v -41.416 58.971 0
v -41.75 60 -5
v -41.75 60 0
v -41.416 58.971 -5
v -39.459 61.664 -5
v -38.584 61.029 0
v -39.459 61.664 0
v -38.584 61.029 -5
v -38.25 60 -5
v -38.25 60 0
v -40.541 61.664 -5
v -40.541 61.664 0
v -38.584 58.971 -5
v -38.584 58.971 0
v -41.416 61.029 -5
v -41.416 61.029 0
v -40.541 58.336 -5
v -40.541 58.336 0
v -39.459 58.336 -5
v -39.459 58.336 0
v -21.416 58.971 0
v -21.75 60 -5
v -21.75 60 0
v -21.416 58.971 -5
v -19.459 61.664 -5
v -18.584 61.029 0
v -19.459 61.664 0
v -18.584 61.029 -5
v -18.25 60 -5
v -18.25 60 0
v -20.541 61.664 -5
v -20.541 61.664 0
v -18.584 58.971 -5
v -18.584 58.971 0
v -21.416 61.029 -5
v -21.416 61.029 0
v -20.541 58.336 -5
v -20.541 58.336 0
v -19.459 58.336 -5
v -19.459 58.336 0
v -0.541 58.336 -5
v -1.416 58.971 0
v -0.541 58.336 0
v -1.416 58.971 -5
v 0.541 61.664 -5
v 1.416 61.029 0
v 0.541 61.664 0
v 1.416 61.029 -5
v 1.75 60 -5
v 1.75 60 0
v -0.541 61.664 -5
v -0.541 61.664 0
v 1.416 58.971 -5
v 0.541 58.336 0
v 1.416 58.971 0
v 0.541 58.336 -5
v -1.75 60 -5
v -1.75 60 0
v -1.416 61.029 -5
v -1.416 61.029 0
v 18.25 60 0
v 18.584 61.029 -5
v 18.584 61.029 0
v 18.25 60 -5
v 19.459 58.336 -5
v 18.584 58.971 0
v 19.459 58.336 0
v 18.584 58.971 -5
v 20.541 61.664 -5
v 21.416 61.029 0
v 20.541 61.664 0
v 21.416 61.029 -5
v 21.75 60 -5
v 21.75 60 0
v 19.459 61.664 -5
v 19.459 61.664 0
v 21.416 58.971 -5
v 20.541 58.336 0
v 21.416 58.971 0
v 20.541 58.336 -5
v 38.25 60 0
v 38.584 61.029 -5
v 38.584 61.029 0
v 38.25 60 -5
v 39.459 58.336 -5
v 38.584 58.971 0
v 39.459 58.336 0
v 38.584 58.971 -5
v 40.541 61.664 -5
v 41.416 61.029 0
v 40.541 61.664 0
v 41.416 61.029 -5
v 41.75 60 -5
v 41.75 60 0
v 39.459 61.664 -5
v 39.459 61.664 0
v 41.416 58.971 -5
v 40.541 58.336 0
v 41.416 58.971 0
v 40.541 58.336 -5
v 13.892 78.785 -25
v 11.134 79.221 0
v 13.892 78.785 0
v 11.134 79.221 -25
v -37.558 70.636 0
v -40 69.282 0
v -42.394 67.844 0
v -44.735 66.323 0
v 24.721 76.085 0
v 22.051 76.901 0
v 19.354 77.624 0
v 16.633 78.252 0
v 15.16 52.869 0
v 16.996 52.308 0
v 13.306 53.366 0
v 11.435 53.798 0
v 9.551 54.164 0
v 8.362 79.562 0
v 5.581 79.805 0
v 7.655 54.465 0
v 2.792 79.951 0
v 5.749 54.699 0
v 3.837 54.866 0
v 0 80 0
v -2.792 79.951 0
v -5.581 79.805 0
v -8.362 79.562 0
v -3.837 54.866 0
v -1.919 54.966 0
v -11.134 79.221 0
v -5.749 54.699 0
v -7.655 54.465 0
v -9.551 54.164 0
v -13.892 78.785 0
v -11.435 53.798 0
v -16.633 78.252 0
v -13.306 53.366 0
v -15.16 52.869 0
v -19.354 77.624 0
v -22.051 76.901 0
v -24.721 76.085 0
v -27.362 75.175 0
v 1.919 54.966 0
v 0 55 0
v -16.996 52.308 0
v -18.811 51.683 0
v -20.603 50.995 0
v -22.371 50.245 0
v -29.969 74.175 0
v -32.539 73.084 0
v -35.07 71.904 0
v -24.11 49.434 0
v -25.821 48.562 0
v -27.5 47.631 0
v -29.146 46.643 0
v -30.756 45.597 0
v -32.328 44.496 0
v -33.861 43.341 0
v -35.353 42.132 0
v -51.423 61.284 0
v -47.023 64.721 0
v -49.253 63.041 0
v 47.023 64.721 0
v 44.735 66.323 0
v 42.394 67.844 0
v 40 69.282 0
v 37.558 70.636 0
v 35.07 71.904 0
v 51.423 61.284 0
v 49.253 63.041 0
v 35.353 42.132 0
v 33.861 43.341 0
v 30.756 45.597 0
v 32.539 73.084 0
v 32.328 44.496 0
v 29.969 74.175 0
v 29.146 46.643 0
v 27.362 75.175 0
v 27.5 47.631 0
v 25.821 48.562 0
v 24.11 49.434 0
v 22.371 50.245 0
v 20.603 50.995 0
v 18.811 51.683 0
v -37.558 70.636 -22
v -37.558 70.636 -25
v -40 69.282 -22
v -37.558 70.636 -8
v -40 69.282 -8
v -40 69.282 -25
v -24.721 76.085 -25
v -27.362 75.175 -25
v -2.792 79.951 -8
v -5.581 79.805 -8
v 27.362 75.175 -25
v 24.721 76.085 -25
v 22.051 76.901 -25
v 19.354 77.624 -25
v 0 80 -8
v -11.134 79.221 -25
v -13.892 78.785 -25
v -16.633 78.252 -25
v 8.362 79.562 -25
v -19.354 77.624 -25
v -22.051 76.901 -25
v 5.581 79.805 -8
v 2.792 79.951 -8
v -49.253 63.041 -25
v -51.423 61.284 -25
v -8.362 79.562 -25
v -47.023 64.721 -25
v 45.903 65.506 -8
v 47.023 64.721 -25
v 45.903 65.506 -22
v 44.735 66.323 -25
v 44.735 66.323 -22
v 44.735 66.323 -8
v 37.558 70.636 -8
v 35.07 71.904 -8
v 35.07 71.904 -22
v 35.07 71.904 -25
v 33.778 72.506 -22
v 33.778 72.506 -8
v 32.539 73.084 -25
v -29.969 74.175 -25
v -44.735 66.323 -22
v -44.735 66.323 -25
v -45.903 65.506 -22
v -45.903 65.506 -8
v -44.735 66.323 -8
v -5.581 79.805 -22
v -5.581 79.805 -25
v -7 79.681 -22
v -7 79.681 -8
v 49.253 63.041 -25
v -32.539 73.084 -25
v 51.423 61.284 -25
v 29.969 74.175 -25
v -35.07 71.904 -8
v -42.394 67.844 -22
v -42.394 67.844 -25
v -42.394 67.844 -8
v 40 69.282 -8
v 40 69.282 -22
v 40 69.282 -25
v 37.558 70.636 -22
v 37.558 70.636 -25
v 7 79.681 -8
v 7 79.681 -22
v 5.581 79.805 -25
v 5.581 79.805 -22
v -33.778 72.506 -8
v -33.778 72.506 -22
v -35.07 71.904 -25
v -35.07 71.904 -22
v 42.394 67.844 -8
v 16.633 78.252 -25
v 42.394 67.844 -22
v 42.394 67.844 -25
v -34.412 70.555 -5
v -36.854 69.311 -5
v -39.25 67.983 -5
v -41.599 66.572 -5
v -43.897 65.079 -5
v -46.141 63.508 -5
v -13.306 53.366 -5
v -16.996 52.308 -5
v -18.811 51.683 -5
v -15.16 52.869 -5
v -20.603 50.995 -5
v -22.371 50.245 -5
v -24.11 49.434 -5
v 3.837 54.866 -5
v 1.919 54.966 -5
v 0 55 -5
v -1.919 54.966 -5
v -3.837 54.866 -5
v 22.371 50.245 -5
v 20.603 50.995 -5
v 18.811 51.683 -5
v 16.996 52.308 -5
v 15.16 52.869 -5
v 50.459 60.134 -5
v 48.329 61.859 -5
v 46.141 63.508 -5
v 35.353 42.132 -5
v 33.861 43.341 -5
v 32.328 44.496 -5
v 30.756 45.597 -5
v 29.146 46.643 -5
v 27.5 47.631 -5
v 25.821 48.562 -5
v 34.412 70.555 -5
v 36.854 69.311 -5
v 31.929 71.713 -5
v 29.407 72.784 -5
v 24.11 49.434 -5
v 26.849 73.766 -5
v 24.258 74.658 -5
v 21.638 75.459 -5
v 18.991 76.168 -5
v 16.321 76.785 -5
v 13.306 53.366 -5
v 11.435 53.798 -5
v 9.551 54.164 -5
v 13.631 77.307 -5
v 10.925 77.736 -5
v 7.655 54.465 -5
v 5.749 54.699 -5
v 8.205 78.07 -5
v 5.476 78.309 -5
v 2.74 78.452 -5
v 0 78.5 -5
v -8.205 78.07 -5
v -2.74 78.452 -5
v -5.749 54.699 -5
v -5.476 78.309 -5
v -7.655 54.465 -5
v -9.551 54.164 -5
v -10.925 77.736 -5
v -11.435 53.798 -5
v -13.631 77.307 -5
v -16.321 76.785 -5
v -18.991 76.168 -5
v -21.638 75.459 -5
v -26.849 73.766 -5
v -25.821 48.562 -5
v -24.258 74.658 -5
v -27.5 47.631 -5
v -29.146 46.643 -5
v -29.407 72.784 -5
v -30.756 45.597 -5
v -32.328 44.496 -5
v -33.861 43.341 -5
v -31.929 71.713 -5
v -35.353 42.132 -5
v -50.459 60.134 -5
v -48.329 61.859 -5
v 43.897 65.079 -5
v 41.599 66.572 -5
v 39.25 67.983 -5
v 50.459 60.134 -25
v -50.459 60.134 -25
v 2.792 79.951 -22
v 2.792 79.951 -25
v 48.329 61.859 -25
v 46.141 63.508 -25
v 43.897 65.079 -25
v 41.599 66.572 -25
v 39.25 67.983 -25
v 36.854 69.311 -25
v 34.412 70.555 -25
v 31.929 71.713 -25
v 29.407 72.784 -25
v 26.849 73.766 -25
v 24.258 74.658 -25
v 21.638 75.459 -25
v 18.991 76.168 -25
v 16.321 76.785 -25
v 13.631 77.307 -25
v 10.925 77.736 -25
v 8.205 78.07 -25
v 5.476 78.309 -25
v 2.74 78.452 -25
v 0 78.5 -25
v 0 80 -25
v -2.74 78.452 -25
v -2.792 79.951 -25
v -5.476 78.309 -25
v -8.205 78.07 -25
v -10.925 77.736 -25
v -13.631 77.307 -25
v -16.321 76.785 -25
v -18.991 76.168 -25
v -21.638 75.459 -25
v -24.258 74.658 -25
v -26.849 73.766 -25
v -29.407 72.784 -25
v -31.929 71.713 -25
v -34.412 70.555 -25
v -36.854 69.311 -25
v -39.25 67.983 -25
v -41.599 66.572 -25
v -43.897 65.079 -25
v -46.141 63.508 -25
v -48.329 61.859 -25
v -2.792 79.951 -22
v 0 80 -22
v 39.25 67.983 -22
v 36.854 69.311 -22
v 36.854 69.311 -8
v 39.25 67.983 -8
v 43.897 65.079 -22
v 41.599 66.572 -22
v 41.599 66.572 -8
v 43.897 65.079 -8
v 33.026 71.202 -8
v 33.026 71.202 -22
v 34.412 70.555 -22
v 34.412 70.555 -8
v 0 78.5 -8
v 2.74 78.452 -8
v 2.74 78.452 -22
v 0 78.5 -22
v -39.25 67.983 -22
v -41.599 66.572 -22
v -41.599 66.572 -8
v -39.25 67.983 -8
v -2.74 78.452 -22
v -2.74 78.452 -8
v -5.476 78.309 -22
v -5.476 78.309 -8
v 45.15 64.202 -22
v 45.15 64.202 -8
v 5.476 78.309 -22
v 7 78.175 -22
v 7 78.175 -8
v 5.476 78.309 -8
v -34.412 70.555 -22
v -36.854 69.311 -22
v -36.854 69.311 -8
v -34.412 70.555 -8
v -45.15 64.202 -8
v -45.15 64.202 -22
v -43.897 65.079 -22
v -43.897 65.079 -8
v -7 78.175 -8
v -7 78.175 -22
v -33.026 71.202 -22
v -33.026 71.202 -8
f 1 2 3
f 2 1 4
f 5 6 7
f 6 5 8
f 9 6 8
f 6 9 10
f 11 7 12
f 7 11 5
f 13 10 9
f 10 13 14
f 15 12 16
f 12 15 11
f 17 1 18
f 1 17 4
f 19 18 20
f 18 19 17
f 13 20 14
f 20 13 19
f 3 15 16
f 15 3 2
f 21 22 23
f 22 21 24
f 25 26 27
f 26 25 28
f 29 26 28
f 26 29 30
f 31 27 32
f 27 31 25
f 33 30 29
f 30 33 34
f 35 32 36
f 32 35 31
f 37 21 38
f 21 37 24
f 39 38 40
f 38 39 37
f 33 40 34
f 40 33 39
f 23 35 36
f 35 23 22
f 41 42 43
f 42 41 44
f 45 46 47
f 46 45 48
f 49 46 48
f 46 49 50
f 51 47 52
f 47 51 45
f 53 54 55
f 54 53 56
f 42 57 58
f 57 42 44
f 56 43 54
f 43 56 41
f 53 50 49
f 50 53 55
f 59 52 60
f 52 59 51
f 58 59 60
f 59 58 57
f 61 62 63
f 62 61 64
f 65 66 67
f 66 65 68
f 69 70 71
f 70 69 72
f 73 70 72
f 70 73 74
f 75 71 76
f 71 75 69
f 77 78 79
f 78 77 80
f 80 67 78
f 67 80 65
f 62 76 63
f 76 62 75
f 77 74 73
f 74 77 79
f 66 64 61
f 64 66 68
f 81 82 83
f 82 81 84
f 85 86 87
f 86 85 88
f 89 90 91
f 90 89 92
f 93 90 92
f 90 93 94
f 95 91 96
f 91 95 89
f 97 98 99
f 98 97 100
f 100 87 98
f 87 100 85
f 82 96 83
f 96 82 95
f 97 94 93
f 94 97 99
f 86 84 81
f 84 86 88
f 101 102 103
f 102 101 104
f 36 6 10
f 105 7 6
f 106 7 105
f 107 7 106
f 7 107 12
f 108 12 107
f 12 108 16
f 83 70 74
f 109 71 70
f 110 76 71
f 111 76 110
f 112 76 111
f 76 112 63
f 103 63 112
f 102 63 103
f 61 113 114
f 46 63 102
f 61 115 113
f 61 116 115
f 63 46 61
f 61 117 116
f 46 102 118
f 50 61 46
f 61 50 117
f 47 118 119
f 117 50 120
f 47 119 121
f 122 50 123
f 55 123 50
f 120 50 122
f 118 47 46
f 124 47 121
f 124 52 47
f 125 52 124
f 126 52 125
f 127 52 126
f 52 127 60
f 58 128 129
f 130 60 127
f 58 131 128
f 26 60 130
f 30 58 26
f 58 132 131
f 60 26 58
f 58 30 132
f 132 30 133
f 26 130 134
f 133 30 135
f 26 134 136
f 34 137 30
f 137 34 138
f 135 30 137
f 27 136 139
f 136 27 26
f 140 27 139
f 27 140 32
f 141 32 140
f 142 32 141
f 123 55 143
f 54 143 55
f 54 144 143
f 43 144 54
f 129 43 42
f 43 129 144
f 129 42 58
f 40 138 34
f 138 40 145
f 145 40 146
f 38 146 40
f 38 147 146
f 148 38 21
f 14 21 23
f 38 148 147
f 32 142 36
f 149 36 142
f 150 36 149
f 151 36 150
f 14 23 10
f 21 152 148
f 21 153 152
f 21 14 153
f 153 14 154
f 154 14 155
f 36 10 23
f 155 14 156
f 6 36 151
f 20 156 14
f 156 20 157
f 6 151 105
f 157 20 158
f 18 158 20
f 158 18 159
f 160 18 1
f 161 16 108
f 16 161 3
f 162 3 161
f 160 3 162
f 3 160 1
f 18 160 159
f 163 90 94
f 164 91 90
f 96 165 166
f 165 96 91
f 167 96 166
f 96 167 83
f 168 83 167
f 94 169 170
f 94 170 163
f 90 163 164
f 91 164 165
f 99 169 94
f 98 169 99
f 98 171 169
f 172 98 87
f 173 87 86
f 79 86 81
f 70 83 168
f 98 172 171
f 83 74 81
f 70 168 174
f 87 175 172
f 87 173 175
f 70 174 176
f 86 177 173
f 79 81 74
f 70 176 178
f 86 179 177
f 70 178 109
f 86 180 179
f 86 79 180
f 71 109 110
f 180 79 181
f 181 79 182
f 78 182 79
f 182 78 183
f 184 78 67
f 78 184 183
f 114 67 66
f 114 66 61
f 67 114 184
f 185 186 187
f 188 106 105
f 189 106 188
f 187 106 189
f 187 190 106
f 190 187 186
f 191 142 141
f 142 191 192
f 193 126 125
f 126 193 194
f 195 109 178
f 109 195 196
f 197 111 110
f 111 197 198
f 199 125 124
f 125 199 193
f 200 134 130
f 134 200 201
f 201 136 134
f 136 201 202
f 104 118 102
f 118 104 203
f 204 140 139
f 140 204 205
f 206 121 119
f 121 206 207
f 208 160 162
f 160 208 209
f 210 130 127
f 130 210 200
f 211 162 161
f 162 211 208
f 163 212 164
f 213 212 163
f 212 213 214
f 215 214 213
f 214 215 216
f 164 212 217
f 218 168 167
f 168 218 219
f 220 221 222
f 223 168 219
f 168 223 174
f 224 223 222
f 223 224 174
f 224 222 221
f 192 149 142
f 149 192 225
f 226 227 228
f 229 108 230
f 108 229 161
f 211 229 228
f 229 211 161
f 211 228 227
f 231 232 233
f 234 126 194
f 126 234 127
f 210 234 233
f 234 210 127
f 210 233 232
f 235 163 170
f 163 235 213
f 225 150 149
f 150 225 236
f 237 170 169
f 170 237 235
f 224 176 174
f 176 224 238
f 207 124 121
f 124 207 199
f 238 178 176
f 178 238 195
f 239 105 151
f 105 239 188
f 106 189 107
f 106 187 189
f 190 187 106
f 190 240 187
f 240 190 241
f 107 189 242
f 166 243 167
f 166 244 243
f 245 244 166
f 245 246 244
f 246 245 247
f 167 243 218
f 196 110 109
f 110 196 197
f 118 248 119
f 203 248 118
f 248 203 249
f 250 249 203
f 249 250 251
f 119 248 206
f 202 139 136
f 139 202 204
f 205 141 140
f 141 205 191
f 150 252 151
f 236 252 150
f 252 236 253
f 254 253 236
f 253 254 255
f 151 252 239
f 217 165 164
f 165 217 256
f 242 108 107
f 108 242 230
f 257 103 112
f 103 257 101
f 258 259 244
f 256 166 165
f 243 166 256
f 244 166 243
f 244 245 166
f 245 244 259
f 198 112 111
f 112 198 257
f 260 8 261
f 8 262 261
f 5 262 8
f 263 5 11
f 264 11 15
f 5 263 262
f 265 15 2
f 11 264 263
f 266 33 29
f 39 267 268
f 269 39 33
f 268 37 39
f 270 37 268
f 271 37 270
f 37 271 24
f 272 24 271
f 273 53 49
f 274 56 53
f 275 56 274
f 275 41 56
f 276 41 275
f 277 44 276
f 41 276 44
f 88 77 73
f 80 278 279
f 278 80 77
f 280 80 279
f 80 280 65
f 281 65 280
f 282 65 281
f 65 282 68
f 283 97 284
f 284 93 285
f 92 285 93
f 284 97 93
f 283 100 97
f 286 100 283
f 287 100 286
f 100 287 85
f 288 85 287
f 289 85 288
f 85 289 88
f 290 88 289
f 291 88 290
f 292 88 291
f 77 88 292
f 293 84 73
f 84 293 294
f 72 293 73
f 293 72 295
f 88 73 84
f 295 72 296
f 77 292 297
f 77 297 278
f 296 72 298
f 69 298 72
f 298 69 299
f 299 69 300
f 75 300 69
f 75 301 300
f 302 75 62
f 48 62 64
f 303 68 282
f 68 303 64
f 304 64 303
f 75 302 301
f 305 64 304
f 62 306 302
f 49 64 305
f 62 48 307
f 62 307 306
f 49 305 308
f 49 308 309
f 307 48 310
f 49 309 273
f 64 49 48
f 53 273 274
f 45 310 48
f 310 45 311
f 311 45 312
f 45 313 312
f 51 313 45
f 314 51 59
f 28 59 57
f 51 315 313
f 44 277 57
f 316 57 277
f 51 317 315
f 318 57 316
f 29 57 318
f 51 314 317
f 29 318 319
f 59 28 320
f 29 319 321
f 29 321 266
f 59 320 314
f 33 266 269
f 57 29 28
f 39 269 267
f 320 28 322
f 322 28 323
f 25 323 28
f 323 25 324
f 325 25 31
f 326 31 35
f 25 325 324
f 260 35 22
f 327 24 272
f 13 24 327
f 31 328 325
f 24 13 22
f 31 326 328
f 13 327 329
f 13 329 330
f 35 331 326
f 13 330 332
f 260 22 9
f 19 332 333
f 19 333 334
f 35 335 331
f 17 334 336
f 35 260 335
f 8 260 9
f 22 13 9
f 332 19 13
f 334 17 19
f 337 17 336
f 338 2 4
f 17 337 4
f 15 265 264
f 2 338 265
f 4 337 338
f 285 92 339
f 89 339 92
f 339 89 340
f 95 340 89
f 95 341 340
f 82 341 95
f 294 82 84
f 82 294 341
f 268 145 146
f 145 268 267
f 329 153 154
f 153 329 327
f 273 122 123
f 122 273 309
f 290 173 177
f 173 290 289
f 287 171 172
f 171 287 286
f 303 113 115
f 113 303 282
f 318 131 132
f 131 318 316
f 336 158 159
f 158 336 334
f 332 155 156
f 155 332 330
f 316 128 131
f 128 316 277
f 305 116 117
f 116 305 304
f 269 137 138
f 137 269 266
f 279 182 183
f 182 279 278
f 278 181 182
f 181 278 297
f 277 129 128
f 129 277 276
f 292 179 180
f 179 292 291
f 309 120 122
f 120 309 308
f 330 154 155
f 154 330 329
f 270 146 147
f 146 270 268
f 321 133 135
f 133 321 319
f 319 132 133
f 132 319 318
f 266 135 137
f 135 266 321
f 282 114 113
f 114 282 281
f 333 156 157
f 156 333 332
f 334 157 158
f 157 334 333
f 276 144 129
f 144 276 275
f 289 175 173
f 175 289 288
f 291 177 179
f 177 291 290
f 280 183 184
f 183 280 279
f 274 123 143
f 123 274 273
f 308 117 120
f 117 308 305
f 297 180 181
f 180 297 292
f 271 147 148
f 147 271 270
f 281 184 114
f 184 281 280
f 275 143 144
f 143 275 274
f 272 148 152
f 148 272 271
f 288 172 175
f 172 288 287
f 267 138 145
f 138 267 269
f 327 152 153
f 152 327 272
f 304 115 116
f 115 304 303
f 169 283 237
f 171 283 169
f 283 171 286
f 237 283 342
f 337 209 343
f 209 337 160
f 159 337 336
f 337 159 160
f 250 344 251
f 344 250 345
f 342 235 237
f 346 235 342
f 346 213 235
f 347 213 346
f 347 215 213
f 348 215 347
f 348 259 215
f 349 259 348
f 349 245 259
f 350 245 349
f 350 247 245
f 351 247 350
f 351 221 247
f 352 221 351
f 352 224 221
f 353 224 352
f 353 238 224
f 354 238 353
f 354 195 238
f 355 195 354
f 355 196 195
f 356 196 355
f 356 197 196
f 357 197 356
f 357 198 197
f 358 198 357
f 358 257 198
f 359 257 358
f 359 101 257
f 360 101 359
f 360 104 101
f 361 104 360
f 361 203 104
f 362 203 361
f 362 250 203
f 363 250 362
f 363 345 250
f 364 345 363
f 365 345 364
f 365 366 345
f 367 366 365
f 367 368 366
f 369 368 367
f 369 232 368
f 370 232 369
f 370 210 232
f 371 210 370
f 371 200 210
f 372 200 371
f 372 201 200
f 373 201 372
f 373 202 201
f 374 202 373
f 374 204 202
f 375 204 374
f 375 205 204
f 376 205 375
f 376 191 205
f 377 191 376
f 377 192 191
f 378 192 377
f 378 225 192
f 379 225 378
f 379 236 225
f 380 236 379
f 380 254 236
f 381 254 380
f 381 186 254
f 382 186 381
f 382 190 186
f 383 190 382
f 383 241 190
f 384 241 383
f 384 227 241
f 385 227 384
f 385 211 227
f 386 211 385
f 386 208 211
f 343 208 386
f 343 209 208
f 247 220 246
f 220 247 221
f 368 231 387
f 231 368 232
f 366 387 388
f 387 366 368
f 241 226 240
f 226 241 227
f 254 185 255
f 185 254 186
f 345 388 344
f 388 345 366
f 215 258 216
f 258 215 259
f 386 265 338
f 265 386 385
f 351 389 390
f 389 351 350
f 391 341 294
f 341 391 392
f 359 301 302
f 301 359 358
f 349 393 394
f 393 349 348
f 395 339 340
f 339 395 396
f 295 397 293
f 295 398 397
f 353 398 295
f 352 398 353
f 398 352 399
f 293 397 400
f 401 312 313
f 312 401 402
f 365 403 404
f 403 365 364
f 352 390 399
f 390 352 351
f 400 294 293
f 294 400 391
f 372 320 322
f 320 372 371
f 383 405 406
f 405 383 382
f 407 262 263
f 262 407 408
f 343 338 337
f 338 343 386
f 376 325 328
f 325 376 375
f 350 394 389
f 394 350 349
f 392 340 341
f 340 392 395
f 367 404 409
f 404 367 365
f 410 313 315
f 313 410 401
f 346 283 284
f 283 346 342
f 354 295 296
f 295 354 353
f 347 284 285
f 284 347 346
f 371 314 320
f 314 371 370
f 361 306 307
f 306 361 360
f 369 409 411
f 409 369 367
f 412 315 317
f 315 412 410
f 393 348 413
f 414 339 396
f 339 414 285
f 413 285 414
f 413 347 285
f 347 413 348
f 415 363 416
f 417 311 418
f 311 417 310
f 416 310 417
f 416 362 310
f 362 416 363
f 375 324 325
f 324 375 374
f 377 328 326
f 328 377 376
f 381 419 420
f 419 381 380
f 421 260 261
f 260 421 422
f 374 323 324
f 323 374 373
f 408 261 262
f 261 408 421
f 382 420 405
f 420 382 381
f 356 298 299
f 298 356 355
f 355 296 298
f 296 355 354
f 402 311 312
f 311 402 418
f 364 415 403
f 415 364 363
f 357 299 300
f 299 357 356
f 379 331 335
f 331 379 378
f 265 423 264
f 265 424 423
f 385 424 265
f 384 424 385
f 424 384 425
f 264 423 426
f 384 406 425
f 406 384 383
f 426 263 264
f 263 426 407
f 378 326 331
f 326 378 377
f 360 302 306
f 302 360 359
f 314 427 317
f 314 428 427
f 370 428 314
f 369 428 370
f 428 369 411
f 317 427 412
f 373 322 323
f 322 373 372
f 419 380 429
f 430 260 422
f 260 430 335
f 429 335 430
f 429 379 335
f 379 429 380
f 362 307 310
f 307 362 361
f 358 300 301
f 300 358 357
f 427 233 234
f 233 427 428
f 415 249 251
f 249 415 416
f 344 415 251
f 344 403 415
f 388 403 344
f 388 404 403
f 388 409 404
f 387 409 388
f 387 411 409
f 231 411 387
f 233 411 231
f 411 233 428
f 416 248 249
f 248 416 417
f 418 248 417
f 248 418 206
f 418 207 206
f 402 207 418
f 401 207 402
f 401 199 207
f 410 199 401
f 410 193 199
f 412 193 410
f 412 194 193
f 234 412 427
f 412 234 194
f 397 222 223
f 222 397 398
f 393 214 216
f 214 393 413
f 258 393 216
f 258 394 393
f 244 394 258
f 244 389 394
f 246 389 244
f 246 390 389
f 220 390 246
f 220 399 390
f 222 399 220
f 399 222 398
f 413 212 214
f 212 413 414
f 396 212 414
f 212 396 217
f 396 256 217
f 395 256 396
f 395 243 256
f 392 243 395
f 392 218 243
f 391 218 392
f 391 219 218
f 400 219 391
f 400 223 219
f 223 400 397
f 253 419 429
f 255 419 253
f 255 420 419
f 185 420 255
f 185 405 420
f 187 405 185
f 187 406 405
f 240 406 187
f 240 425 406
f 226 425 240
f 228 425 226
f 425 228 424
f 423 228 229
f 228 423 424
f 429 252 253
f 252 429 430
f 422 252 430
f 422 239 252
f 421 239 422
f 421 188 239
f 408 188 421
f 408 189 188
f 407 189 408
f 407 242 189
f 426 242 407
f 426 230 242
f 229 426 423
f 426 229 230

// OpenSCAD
// file: orp_circular_plate_3d.scad
// Parameters
//plate_diameter = 160;
//plate_thickness = 3;


module orp_plate(plate_diameter, plate_thickness = 3, plate_resolution = 50, hole_resolution = 10){
    hole_diameter = 3.5; // ORP rules
    hole_spacing = 20; // ORP rules
    num_holes_x = floor(plate_diameter / hole_spacing);
    num_holes_y = floor(plate_diameter / hole_spacing);
    
    difference() {
        cylinder(h = plate_thickness, d = plate_diameter, $fn=plate_resolution);
    
        for (i = [-floor(plate_diameter / hole_spacing / 2):floor(plate_diameter / hole_spacing / 2)]) {
            for (j = [-floor(plate_diameter / hole_spacing / 2):floor(plate_diameter / hole_spacing / 2)]) {
                x = i * hole_spacing;
                y = j * hole_spacing;
                if (sqrt(x*x + y*y) + hole_diameter/2 <= plate_diameter/2) {
                    translate([x, y, -1])
                        cylinder(h = plate_thickness + 2, d = hole_diameter, $fn=hole_resolution);
                }
            }
        }
    }
}
// main file
$fn = 180;
mount_outer_radius = 80;
mount_inner_radius = mount_outer_radius -25;
mount_thickness = 5;
lip_depth = 20;
lip_thickness = 1.5;

include <orp_circular_plate_3d.scad>;

module cut_wedge(h, start_angle = 40, end_angle = 320){
        linear_extrude(h+1){
        points = [
            [0, 0], // Center of the cylinder
    
            // Points along the arc for the 90-degree segment
            for (angle = start_angle; angle <= end_angle; angle = angle + 1) // Increment by 1 degree for smoothness
                [(mount_outer_radius+1) * sin(angle), (mount_outer_radius+1) * cos(angle)]
        ];
        //echo(points);
        polygon(points = points);
        
    }}
 
    
module cut_switch_hole(radius, angle, switch_hole_size = 14, cut_depth = 1.5){
    //radius is the distance from the orgin for the cut to start
    //angle is the angle relative to the y axis
    rotate([-90, 0, angle])
    translate([0, -(lip_depth/2), radius-cut_depth]){
        linear_extrude(height = cut_depth*2, center = true) { 
            square(size = switch_hole_size, center = true);
        }
    }
}

//orp_plate(mount_outer_radius*2);
translate([0, 0, -mount_thickness])
difference(){
    orp_plate(mount_outer_radius*2, plate_thickness = mount_thickness, plate_resolution = 180);
    cylinder(h = mount_thickness, r = mount_inner_radius);
    cut_wedge(h = mount_thickness);
}
// add the outer lip
translate([0, 0, -(mount_thickness+lip_depth)])
difference(){
    cylinder(h = lip_depth, r = mount_outer_radius);
    cylinder(h = lip_depth, r = (mount_outer_radius - lip_thickness));
    cut_wedge(h = lip_depth);
    #cut_switch_hole(radius = mount_outer_radius, angle = 0); 
    #cut_switch_hole(radius = mount_outer_radius, angle = -30); 
    #cut_switch_hole(radius = mount_outer_radius, angle = 30); 
}
